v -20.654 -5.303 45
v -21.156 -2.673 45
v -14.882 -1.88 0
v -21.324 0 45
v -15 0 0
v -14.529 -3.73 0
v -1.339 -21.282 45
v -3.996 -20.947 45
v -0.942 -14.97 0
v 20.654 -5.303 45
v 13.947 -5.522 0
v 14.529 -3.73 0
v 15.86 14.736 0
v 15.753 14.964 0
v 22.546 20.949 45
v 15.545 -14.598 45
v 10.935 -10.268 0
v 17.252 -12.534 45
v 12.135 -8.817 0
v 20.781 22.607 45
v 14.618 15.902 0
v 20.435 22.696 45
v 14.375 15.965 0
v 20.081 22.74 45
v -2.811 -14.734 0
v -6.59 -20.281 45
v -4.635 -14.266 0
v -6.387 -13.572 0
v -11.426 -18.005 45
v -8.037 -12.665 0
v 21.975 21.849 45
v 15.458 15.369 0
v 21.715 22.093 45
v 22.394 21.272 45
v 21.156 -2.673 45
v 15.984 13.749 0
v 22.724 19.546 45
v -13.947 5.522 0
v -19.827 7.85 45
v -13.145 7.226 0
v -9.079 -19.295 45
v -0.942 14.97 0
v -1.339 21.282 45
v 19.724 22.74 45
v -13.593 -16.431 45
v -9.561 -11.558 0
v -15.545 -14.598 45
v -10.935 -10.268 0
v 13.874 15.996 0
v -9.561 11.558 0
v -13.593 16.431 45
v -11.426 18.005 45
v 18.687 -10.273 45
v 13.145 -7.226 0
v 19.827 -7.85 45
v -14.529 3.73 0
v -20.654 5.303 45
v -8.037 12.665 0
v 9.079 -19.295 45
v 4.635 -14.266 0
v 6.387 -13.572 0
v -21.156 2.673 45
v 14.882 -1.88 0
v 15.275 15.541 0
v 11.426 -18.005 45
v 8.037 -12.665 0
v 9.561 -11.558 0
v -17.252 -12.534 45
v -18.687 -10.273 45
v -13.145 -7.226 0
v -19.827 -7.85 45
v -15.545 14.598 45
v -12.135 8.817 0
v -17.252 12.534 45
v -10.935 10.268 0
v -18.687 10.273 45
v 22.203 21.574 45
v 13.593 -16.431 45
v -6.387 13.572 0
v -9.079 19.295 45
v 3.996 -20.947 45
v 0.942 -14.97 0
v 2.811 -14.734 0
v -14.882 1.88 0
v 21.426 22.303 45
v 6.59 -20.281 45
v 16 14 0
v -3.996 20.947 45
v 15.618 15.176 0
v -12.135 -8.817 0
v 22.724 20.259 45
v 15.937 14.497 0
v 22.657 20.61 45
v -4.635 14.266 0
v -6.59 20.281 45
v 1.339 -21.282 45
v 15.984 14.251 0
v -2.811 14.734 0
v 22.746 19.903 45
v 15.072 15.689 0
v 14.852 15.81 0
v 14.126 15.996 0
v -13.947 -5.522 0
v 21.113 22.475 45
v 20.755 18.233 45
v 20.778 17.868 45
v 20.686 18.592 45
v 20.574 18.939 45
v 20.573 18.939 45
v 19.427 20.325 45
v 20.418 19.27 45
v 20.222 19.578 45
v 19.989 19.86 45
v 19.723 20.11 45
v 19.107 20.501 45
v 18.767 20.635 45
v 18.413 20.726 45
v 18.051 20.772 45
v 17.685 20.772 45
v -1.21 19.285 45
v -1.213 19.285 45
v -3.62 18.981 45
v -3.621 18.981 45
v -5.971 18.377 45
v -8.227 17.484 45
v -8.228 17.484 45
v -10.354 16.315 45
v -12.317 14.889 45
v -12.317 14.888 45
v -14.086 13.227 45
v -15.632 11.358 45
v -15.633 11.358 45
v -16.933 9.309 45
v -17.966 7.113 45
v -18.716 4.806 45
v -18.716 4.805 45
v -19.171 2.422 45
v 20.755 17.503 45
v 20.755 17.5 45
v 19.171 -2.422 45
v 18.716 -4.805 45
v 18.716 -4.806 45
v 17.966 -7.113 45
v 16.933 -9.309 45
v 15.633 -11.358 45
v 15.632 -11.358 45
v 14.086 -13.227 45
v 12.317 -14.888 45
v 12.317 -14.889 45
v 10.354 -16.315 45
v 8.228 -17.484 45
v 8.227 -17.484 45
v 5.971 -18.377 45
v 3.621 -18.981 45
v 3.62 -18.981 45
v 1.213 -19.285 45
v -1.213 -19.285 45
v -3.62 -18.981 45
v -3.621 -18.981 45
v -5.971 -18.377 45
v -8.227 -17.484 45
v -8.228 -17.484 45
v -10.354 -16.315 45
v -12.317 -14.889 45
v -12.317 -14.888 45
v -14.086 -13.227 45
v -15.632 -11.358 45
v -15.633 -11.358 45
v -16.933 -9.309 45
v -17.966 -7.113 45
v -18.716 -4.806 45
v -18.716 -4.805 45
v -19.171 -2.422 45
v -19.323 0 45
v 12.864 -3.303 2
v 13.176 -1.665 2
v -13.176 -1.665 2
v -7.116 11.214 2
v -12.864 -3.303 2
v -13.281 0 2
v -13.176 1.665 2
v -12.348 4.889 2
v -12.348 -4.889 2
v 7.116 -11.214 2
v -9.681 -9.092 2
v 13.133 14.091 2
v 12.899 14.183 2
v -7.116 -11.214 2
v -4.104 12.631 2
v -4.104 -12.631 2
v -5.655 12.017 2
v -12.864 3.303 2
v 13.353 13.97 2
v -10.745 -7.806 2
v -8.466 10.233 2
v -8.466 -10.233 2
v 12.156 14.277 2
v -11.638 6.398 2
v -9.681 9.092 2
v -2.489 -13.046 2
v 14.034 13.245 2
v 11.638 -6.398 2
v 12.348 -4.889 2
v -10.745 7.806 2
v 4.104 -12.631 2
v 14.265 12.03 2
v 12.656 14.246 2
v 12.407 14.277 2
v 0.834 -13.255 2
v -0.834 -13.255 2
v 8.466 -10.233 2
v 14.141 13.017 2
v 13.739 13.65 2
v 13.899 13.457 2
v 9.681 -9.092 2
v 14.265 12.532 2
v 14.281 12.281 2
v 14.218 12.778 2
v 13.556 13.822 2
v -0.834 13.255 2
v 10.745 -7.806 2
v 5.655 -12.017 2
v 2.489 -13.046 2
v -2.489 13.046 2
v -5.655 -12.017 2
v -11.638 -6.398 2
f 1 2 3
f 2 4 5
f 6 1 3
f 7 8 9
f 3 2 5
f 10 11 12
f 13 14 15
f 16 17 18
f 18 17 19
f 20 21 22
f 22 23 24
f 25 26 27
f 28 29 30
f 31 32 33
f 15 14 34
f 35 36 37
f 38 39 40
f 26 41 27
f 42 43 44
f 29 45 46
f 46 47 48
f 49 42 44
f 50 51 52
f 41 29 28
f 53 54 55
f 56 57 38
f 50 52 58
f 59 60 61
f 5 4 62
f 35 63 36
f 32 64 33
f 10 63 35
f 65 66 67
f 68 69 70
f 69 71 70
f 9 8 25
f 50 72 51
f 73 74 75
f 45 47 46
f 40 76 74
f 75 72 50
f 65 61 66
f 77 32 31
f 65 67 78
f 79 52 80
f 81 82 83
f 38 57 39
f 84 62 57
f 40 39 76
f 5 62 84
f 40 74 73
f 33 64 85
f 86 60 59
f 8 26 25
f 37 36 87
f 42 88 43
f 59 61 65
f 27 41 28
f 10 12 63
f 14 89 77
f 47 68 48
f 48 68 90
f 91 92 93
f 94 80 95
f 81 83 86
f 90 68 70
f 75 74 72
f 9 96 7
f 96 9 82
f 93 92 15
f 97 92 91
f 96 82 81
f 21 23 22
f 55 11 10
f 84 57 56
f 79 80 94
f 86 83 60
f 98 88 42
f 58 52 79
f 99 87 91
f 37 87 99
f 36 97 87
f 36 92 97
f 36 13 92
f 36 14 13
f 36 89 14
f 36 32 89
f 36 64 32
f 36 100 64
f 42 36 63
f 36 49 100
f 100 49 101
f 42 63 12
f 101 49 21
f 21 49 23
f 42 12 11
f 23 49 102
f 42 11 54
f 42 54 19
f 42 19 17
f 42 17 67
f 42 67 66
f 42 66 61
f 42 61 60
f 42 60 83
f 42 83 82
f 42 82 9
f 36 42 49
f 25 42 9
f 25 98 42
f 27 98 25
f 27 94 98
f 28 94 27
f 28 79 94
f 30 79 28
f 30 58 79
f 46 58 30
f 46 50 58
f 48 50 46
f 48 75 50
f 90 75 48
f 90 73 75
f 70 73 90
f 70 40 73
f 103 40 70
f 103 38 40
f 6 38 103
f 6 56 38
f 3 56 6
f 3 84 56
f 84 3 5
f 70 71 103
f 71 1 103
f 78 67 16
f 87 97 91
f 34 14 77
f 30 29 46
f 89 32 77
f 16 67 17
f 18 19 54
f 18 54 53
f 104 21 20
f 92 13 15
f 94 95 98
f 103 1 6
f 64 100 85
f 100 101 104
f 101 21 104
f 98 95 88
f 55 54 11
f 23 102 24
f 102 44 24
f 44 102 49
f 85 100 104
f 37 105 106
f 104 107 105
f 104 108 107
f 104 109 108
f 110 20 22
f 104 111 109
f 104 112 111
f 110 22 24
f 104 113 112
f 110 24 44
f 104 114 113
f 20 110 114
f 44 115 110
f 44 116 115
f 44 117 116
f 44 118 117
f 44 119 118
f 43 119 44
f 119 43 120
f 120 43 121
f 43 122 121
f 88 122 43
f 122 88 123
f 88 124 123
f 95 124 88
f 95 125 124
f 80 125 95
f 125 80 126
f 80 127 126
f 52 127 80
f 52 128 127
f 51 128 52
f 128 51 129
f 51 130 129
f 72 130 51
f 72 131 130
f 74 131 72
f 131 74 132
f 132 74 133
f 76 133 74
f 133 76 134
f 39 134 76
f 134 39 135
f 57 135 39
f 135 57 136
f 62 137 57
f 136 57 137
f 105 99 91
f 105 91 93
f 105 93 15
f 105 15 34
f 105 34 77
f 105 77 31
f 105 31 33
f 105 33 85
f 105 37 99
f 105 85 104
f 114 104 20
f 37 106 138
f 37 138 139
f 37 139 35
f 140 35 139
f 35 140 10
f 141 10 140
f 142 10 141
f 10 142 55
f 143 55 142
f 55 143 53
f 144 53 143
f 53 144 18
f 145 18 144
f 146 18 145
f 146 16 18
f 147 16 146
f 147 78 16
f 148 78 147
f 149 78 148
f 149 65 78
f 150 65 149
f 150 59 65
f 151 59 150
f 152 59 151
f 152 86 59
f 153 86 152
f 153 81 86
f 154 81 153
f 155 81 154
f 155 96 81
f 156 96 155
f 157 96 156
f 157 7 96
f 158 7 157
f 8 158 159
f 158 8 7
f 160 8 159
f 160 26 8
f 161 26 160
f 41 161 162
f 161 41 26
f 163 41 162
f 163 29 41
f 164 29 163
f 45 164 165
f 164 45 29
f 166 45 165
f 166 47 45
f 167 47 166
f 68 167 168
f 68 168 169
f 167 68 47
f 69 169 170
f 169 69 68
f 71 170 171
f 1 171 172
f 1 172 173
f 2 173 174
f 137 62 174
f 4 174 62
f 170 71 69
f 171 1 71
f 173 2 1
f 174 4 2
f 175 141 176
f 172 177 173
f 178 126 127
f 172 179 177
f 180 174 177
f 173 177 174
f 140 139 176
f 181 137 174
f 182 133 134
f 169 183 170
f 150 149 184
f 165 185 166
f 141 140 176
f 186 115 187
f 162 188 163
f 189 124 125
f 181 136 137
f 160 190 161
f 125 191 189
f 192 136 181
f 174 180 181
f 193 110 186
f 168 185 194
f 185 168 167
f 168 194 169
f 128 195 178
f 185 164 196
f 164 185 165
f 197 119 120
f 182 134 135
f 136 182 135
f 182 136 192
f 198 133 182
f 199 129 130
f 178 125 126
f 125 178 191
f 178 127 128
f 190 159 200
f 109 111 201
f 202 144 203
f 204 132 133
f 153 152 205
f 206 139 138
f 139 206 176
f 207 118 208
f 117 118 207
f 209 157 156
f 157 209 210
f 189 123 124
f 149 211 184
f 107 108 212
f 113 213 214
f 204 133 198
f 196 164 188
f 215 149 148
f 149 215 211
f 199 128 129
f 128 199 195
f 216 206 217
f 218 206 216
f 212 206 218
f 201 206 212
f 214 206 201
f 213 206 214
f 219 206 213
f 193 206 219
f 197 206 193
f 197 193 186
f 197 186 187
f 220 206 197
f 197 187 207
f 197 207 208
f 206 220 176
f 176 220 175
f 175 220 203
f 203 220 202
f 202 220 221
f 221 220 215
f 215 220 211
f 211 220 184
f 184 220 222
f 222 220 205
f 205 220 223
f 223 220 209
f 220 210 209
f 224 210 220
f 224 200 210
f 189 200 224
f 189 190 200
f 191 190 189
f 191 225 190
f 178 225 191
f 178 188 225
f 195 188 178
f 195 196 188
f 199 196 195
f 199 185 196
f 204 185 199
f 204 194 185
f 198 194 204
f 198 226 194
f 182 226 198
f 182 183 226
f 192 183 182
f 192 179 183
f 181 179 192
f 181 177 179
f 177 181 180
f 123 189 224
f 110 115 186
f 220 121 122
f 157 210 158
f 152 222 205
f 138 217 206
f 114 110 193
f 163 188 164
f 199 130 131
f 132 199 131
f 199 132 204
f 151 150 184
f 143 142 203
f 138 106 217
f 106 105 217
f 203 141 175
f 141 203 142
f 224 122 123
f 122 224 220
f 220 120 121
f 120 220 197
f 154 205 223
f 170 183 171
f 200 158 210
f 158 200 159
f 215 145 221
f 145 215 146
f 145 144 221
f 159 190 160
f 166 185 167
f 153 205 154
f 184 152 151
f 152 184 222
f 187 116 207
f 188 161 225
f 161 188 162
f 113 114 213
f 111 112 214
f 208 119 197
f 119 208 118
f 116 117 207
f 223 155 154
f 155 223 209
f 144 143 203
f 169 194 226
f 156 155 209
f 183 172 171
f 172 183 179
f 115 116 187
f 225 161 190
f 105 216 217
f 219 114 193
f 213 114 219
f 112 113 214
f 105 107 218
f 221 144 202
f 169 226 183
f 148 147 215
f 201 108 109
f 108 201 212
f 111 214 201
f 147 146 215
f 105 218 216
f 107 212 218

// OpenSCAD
/*  creatung a teardrop shot gass

*/

$fn=50;
eps=0.01;

function scale(base,height,slope) =
    let( top = base + tan(slope)*height)
    top/base;

module teardrop(base,height,scale=1.5) {
     linear_extrude(height=height,scale=scale)
     union () {
         circle(base);
         square(base);
     }
 } 
 
module teardrop_hull(base,height,scale=1.5,round=2) {
     linear_extrude(height=height,scale=scale)
     hull () {
         circle(base);
         translate([base-round/2,base-round/2,0]) 
              circle(round);
     }
 } 

module teardrop_mink(base,height,scale=1.5,round=2) {
  minkowski() {
     linear_extrude(height=height,scale=scale)
        union () {
         circle(base);
         square(base);
     }
     sphere(round);
   }
 }
 
//translate([0,0,-61])
module teardrop_glass(base,height,thickness,slope) {
    outer_scale= scale(base,height,slope);
    top = base * outer_scale;
    inner_base = (base - thickness)+ tan(slope) * thickness;
    inner_scale =  (top -thickness) / inner_base;
 //   echo(outer_scale,top,inner_base,inner_scale);
    difference() {
       teardrop_hull(base,height,outer_scale);
       translate([0,0,thickness])
            teardrop_hull(inner_base, height-thickness+eps,inner_scale);
    //   cube(100);
    }
}


teardrop_glass(15,45,2,8);
